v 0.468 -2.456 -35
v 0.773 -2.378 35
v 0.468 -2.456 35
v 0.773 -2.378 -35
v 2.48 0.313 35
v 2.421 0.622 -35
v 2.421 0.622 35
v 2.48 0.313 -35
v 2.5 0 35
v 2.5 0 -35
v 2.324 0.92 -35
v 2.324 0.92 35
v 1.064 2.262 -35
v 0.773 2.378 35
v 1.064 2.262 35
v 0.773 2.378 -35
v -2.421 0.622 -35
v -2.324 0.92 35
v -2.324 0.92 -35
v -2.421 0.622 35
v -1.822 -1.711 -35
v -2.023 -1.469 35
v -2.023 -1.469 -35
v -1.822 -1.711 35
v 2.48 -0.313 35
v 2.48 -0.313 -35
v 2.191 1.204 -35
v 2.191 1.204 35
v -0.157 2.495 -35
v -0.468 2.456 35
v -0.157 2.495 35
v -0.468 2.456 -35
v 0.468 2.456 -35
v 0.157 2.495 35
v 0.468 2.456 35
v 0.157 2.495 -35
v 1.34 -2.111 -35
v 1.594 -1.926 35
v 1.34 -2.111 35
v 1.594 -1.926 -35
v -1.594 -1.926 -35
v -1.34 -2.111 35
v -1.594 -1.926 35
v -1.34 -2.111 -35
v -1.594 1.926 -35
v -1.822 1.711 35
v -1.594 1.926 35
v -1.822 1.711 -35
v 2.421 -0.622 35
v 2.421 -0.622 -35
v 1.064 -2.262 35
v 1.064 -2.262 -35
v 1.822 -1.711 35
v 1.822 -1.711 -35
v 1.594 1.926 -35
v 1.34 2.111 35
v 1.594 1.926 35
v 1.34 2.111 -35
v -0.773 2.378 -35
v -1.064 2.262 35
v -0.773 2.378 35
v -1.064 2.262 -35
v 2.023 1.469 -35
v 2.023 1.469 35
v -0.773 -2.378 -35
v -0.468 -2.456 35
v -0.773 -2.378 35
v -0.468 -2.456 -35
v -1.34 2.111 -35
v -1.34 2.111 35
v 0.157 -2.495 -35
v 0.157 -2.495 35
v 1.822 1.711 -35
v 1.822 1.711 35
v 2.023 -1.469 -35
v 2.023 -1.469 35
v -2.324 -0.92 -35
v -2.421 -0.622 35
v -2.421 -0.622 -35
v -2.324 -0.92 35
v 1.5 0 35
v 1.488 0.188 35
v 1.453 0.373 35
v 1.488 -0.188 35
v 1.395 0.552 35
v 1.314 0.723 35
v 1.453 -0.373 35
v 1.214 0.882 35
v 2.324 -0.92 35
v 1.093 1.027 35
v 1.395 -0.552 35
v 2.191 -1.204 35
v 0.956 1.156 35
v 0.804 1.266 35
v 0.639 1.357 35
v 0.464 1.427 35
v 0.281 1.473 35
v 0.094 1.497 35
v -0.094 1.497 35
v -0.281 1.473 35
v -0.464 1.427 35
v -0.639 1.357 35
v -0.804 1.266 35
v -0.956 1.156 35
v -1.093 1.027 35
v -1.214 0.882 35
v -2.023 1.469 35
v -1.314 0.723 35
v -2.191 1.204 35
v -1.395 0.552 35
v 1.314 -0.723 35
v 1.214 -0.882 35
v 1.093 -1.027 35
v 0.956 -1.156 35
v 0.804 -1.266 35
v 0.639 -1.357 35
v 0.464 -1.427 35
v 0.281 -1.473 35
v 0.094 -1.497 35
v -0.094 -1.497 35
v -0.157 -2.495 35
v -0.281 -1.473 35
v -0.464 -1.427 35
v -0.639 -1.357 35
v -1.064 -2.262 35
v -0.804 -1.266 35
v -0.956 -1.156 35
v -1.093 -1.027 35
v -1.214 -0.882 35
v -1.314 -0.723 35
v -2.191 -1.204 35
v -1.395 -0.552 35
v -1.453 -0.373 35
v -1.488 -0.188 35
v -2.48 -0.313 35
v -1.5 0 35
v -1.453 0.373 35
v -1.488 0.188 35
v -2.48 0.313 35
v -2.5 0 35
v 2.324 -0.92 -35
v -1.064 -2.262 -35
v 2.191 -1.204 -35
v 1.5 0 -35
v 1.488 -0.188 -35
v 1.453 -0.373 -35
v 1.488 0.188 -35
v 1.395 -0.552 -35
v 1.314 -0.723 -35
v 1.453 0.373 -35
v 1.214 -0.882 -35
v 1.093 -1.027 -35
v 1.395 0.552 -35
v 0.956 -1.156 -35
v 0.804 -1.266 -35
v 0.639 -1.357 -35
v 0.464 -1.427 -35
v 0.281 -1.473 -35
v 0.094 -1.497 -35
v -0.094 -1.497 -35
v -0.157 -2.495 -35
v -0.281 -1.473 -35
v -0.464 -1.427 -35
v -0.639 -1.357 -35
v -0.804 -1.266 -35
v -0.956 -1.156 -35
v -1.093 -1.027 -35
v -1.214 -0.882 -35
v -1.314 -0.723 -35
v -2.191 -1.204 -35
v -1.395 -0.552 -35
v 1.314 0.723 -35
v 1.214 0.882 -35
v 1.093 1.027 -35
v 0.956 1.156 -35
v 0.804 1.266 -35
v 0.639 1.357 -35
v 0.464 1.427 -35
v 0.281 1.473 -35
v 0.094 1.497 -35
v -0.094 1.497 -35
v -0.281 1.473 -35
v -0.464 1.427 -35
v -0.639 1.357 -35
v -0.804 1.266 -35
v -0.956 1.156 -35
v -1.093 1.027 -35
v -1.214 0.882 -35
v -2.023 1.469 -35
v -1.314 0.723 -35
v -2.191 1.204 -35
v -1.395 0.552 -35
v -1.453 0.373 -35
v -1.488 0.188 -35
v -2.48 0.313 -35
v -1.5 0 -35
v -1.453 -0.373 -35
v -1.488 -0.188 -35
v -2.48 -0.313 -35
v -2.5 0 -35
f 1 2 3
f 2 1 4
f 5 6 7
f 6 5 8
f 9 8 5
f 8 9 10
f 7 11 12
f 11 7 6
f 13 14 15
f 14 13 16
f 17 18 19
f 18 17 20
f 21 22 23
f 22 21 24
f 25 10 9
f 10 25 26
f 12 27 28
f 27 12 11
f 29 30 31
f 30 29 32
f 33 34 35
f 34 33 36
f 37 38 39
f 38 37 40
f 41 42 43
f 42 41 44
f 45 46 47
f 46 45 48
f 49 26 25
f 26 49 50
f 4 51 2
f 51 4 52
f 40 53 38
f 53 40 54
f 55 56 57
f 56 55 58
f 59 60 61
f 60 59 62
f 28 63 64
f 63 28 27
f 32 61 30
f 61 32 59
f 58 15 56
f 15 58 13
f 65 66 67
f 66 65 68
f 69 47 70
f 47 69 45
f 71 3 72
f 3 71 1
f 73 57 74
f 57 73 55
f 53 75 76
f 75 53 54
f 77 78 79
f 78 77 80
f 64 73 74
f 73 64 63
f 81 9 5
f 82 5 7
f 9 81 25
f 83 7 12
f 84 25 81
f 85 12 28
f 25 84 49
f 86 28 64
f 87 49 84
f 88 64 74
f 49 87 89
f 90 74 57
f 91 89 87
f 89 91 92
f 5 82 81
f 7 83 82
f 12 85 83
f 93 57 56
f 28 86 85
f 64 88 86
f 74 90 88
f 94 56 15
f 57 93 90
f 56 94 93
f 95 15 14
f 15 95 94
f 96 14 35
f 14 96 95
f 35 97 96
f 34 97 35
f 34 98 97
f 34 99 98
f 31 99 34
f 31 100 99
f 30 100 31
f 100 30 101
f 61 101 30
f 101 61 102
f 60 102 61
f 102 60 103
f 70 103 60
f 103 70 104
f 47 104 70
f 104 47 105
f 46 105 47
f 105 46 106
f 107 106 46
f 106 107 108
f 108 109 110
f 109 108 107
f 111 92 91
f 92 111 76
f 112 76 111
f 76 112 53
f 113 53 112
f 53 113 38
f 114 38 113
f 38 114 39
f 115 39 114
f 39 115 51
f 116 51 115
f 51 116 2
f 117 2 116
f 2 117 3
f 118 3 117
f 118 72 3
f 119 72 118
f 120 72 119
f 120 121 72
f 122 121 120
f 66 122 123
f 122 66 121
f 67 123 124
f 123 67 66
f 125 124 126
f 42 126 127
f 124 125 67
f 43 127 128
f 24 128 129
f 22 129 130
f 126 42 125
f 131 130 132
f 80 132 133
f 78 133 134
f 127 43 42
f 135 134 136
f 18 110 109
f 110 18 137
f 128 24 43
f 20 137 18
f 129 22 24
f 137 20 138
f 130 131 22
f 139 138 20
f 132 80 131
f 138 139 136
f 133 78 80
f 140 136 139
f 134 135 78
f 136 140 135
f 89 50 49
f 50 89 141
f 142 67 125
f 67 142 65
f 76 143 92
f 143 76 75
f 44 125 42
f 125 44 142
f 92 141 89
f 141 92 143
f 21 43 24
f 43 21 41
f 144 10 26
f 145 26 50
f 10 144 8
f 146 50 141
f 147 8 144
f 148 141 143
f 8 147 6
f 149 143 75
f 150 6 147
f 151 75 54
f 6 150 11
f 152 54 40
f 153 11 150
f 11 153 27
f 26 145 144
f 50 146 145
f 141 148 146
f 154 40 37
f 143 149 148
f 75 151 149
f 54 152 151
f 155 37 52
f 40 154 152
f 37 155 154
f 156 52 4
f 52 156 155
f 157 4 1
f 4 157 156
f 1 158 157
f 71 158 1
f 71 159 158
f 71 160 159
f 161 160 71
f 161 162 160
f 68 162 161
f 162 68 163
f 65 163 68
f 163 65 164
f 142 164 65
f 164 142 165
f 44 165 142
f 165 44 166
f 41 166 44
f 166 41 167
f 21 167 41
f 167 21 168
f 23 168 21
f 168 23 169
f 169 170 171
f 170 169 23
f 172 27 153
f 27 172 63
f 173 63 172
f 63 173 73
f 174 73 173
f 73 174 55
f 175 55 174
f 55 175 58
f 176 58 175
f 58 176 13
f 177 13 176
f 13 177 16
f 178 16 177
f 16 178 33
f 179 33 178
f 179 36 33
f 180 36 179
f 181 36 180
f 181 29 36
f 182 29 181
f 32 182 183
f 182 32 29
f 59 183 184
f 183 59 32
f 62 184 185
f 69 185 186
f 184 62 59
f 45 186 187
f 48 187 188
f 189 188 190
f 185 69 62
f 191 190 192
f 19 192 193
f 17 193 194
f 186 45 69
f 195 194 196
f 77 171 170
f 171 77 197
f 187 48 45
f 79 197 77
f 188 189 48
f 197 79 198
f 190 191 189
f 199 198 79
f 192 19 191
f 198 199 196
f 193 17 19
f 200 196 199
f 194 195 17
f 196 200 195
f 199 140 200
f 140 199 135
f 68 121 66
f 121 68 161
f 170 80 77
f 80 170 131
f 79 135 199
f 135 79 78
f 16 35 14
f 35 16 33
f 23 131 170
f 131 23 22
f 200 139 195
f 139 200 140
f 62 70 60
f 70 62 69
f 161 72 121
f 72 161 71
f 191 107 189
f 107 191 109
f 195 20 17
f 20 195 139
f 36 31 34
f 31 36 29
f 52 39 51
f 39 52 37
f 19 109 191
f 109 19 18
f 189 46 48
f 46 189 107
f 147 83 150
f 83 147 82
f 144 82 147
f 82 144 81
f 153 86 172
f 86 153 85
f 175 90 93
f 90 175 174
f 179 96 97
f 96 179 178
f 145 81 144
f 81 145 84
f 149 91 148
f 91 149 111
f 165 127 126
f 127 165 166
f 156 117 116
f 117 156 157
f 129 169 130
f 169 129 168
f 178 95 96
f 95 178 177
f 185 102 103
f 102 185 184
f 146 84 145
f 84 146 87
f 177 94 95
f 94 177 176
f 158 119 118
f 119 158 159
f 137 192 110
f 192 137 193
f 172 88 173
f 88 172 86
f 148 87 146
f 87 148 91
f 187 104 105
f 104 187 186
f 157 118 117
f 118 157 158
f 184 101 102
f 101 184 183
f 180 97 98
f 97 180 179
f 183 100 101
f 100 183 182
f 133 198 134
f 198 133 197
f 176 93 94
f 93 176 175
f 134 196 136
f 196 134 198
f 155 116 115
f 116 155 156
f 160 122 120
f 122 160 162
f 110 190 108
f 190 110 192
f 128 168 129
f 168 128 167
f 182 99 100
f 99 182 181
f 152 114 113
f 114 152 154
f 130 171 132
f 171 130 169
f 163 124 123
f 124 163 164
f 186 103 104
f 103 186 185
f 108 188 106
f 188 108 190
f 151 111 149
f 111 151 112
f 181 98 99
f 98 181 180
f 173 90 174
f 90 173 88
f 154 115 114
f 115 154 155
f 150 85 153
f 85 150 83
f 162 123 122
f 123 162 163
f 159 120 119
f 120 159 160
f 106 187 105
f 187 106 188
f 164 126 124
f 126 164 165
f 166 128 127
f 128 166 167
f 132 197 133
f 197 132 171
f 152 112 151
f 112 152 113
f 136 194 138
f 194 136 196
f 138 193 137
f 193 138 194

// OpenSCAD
$fn = 50;


difference() {
	union() {
		translate(v = [0, 0, -35.0000000000]) {
			cylinder(h = 70, r = 2.5000000000);
		}
	}
	union() {
		translate(v = [0, 0, -100.0000000000]) {
			cylinder(h = 200, r = 1.5000000000);
		}
	}
}
